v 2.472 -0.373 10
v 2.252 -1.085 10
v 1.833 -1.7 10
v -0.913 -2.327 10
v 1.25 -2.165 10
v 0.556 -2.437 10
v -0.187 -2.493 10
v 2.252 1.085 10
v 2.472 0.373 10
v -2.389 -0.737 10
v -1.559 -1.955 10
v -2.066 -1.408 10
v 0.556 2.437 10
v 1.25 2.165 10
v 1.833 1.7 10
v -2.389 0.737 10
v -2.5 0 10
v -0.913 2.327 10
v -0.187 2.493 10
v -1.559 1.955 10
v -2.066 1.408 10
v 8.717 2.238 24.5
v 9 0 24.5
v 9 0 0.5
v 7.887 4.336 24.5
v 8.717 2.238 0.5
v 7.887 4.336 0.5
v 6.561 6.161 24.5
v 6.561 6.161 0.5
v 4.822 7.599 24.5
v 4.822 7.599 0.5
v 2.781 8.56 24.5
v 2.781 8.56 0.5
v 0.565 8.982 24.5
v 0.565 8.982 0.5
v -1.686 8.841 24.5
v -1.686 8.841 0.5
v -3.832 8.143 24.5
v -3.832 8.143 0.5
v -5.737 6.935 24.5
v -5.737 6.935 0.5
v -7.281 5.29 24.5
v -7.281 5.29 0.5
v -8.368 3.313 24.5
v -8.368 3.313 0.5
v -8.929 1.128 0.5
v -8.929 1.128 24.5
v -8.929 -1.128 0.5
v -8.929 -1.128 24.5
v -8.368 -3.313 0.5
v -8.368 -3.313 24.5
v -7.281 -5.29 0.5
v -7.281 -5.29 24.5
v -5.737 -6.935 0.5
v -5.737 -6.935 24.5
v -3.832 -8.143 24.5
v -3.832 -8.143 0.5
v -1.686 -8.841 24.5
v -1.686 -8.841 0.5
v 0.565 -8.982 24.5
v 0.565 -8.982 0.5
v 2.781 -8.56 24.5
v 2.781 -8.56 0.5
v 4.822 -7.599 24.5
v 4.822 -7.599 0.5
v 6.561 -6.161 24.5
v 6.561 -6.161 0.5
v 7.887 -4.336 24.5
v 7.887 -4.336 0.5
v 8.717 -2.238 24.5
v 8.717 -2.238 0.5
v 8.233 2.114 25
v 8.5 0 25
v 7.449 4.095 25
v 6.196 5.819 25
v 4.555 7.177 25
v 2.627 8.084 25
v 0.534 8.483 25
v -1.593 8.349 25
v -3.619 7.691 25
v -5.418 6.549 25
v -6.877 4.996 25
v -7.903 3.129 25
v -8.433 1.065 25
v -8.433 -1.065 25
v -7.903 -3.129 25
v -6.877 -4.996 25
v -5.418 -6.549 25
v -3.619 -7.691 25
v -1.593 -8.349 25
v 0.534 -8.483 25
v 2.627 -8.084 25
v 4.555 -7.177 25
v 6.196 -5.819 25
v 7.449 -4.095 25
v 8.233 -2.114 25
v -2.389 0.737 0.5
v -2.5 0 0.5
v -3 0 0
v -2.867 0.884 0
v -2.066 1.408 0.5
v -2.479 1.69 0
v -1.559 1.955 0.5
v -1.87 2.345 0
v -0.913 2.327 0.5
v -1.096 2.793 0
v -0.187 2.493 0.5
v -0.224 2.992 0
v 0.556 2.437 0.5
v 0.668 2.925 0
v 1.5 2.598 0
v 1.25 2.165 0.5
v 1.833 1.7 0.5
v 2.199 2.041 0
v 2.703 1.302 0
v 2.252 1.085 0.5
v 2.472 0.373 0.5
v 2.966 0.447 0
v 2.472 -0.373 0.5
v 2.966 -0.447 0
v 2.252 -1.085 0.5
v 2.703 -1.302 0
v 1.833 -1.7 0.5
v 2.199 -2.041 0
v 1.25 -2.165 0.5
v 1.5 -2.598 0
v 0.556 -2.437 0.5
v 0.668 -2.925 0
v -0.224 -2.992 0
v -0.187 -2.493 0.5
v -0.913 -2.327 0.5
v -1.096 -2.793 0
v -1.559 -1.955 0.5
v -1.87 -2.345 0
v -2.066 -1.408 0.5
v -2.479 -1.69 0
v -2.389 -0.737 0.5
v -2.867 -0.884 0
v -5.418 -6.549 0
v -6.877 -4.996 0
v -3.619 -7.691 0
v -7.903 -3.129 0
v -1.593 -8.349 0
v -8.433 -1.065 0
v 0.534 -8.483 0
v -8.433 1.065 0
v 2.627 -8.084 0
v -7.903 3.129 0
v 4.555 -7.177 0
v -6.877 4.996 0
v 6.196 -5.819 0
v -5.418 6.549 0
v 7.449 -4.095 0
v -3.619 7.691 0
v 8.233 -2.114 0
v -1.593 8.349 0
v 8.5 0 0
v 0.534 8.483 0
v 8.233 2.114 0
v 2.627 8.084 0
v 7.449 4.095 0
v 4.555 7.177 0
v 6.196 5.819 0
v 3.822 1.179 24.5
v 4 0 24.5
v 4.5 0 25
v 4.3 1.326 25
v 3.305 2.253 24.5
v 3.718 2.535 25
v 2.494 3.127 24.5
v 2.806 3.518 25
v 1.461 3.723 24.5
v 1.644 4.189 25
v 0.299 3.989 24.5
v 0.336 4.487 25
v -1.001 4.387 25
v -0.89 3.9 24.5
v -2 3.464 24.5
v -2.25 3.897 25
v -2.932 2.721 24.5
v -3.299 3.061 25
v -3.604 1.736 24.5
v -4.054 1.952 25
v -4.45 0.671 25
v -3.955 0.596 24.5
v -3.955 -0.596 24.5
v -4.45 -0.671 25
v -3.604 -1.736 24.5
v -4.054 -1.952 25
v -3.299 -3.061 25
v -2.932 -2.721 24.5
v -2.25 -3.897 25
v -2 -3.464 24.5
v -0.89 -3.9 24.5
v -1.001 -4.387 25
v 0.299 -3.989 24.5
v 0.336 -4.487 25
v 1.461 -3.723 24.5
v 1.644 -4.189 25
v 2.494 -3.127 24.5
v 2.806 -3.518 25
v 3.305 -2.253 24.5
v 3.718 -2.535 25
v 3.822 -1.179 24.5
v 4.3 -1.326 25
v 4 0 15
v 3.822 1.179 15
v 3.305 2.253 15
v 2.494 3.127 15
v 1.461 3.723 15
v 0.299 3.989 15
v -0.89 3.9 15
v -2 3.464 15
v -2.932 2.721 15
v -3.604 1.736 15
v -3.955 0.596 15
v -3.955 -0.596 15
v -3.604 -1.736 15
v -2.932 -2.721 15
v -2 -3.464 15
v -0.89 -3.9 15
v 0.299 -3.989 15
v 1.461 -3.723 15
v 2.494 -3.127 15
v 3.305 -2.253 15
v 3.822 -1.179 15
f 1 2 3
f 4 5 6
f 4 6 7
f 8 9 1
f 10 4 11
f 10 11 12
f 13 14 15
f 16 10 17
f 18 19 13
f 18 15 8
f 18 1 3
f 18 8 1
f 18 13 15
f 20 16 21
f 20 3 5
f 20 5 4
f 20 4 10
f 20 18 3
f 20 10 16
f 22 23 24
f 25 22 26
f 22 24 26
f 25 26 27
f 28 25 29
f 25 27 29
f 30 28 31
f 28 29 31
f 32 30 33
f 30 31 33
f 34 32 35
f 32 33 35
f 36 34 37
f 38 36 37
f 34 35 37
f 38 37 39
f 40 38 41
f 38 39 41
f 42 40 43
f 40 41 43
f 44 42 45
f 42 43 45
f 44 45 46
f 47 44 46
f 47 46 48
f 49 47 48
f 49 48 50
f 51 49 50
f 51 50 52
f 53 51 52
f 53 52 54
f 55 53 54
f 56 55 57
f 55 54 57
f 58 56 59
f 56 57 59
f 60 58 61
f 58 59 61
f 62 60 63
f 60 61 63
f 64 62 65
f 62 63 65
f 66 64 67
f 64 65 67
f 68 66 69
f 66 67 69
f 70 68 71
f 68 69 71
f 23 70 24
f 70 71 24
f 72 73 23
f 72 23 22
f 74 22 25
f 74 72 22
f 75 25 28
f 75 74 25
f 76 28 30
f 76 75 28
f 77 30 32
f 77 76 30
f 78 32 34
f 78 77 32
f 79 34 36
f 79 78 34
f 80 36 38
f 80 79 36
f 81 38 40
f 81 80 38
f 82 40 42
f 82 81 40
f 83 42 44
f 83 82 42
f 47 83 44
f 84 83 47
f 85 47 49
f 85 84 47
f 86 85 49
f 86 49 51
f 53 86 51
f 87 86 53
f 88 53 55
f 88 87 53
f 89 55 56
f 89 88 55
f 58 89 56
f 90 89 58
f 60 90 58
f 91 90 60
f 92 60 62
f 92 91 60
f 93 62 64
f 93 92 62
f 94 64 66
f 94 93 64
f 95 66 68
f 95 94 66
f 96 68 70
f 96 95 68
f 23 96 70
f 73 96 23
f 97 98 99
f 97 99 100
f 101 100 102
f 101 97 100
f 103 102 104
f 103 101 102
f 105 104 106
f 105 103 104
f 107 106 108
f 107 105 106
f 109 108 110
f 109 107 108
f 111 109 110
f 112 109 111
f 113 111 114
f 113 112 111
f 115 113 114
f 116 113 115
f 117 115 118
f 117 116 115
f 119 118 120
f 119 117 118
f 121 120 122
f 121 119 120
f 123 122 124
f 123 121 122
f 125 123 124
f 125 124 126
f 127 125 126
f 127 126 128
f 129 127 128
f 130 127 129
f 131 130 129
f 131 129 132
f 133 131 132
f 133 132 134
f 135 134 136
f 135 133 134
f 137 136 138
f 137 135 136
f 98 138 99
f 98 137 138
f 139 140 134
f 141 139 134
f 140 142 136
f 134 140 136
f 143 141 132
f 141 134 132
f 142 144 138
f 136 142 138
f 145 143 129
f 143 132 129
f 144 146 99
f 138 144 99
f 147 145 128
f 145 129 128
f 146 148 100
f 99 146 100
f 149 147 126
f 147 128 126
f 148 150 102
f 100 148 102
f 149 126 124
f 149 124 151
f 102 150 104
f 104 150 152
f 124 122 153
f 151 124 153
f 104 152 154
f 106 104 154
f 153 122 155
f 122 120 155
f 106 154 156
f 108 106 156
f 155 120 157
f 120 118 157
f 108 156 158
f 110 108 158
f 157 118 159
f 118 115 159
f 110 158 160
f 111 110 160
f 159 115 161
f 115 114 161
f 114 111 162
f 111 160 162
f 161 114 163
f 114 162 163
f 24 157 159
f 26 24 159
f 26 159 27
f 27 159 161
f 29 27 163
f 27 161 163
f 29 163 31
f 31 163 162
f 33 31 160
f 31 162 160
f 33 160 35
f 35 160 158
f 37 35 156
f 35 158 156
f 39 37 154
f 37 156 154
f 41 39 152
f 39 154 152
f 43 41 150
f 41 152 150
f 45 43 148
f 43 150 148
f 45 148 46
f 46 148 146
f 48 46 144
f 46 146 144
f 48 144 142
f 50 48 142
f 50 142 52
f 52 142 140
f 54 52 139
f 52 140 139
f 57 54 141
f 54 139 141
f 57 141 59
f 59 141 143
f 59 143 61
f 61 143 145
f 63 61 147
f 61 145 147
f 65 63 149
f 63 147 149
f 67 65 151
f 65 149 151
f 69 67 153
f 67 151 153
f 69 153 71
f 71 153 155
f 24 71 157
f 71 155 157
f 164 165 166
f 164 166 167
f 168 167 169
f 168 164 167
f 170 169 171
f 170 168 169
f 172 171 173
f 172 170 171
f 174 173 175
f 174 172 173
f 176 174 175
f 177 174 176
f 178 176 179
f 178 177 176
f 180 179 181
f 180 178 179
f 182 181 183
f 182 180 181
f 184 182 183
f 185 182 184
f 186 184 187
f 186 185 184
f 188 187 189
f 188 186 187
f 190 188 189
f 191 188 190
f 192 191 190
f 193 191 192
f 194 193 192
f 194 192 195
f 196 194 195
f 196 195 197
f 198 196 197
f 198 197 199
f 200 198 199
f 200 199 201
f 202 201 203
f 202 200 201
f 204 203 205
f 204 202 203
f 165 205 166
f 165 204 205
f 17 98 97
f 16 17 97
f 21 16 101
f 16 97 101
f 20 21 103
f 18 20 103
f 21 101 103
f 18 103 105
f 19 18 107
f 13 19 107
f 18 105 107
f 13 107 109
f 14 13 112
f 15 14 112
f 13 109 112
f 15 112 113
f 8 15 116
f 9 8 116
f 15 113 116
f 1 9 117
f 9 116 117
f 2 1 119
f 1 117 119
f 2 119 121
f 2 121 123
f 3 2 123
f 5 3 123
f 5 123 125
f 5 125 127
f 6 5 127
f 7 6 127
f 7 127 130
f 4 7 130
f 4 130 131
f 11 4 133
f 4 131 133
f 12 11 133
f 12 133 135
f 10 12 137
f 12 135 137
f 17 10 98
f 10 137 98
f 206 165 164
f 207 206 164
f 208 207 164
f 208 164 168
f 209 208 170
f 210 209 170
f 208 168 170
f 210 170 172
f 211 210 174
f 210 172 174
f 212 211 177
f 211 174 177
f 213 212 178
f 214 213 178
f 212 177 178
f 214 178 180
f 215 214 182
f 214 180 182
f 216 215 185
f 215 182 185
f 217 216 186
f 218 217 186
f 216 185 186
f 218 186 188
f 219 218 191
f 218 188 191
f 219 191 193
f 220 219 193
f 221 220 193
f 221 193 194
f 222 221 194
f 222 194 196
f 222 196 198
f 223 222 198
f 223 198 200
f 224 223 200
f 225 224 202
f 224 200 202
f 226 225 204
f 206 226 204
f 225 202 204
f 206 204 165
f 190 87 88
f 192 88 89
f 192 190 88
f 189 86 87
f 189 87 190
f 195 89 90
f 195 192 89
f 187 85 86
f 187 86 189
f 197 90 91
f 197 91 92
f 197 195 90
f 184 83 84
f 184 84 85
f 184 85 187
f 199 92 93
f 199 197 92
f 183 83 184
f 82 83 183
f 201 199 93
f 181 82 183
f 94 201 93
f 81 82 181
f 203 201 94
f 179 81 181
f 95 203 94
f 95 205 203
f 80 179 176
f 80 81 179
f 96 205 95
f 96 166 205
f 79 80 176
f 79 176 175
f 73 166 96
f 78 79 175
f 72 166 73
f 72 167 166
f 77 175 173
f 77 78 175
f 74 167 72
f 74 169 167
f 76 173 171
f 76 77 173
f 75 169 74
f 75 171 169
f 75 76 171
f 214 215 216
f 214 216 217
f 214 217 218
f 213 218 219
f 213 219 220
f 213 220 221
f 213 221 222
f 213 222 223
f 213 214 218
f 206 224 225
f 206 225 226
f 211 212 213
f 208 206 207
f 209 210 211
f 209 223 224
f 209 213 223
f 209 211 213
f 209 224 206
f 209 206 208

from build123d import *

# Parameters (mm, degrees)
SZKIC1_R                    = 9
DODANIE_WYCI_GNI_CIE1_DEPTH = 25
SZKIC2_R                    = 4
WYTNIJ_WYCI_GNI_CIE1_DEPTH  = 10
SZKIC3_R                    = 2.5
WYTNIJ_WYCI_GNI_CIE2_DEPTH  = 10
SFAZOWANIE1_SIZE            = 0.5


with BuildPart() as part:
    # Szkic1 → Dodanie-wyciągnięcie1 (new body)
    with BuildSketch(Plane.XY):
        Circle(SZKIC1_R)
    extrude(amount=DODANIE_WYCI_GNI_CIE1_DEPTH)

    # Szkic2 → Wytnij-wyciągnięcie1 (cut)
    with BuildSketch(Plane.XY.offset(25)):
        Circle(SZKIC2_R)
    extrude(amount=-WYTNIJ_WYCI_GNI_CIE1_DEPTH, mode=Mode.SUBTRACT)

    # Szkic3 → Wytnij-wyciągnięcie2 (cut)
    with BuildSketch(Plane(origin=(0, 0, 0), x_dir=(-1, 0, 0), z_dir=(0, 0, -1))):
        Circle(SZKIC3_R)
    extrude(amount=-WYTNIJ_WYCI_GNI_CIE2_DEPTH, mode=Mode.SUBTRACT)

    # Sfazowanie1
    sfazowanie1_edges = [part.edges().sort_by_distance(p)[0] for p in [
        (2.5, 0, 0),
        (-9, 0, 0),
        (-9, 0, 25),
        (-4, 0, 25),
    ]]
    chamfer(sfazowanie1_edges, length=SFAZOWANIE1_SIZE)


solid = part.part
